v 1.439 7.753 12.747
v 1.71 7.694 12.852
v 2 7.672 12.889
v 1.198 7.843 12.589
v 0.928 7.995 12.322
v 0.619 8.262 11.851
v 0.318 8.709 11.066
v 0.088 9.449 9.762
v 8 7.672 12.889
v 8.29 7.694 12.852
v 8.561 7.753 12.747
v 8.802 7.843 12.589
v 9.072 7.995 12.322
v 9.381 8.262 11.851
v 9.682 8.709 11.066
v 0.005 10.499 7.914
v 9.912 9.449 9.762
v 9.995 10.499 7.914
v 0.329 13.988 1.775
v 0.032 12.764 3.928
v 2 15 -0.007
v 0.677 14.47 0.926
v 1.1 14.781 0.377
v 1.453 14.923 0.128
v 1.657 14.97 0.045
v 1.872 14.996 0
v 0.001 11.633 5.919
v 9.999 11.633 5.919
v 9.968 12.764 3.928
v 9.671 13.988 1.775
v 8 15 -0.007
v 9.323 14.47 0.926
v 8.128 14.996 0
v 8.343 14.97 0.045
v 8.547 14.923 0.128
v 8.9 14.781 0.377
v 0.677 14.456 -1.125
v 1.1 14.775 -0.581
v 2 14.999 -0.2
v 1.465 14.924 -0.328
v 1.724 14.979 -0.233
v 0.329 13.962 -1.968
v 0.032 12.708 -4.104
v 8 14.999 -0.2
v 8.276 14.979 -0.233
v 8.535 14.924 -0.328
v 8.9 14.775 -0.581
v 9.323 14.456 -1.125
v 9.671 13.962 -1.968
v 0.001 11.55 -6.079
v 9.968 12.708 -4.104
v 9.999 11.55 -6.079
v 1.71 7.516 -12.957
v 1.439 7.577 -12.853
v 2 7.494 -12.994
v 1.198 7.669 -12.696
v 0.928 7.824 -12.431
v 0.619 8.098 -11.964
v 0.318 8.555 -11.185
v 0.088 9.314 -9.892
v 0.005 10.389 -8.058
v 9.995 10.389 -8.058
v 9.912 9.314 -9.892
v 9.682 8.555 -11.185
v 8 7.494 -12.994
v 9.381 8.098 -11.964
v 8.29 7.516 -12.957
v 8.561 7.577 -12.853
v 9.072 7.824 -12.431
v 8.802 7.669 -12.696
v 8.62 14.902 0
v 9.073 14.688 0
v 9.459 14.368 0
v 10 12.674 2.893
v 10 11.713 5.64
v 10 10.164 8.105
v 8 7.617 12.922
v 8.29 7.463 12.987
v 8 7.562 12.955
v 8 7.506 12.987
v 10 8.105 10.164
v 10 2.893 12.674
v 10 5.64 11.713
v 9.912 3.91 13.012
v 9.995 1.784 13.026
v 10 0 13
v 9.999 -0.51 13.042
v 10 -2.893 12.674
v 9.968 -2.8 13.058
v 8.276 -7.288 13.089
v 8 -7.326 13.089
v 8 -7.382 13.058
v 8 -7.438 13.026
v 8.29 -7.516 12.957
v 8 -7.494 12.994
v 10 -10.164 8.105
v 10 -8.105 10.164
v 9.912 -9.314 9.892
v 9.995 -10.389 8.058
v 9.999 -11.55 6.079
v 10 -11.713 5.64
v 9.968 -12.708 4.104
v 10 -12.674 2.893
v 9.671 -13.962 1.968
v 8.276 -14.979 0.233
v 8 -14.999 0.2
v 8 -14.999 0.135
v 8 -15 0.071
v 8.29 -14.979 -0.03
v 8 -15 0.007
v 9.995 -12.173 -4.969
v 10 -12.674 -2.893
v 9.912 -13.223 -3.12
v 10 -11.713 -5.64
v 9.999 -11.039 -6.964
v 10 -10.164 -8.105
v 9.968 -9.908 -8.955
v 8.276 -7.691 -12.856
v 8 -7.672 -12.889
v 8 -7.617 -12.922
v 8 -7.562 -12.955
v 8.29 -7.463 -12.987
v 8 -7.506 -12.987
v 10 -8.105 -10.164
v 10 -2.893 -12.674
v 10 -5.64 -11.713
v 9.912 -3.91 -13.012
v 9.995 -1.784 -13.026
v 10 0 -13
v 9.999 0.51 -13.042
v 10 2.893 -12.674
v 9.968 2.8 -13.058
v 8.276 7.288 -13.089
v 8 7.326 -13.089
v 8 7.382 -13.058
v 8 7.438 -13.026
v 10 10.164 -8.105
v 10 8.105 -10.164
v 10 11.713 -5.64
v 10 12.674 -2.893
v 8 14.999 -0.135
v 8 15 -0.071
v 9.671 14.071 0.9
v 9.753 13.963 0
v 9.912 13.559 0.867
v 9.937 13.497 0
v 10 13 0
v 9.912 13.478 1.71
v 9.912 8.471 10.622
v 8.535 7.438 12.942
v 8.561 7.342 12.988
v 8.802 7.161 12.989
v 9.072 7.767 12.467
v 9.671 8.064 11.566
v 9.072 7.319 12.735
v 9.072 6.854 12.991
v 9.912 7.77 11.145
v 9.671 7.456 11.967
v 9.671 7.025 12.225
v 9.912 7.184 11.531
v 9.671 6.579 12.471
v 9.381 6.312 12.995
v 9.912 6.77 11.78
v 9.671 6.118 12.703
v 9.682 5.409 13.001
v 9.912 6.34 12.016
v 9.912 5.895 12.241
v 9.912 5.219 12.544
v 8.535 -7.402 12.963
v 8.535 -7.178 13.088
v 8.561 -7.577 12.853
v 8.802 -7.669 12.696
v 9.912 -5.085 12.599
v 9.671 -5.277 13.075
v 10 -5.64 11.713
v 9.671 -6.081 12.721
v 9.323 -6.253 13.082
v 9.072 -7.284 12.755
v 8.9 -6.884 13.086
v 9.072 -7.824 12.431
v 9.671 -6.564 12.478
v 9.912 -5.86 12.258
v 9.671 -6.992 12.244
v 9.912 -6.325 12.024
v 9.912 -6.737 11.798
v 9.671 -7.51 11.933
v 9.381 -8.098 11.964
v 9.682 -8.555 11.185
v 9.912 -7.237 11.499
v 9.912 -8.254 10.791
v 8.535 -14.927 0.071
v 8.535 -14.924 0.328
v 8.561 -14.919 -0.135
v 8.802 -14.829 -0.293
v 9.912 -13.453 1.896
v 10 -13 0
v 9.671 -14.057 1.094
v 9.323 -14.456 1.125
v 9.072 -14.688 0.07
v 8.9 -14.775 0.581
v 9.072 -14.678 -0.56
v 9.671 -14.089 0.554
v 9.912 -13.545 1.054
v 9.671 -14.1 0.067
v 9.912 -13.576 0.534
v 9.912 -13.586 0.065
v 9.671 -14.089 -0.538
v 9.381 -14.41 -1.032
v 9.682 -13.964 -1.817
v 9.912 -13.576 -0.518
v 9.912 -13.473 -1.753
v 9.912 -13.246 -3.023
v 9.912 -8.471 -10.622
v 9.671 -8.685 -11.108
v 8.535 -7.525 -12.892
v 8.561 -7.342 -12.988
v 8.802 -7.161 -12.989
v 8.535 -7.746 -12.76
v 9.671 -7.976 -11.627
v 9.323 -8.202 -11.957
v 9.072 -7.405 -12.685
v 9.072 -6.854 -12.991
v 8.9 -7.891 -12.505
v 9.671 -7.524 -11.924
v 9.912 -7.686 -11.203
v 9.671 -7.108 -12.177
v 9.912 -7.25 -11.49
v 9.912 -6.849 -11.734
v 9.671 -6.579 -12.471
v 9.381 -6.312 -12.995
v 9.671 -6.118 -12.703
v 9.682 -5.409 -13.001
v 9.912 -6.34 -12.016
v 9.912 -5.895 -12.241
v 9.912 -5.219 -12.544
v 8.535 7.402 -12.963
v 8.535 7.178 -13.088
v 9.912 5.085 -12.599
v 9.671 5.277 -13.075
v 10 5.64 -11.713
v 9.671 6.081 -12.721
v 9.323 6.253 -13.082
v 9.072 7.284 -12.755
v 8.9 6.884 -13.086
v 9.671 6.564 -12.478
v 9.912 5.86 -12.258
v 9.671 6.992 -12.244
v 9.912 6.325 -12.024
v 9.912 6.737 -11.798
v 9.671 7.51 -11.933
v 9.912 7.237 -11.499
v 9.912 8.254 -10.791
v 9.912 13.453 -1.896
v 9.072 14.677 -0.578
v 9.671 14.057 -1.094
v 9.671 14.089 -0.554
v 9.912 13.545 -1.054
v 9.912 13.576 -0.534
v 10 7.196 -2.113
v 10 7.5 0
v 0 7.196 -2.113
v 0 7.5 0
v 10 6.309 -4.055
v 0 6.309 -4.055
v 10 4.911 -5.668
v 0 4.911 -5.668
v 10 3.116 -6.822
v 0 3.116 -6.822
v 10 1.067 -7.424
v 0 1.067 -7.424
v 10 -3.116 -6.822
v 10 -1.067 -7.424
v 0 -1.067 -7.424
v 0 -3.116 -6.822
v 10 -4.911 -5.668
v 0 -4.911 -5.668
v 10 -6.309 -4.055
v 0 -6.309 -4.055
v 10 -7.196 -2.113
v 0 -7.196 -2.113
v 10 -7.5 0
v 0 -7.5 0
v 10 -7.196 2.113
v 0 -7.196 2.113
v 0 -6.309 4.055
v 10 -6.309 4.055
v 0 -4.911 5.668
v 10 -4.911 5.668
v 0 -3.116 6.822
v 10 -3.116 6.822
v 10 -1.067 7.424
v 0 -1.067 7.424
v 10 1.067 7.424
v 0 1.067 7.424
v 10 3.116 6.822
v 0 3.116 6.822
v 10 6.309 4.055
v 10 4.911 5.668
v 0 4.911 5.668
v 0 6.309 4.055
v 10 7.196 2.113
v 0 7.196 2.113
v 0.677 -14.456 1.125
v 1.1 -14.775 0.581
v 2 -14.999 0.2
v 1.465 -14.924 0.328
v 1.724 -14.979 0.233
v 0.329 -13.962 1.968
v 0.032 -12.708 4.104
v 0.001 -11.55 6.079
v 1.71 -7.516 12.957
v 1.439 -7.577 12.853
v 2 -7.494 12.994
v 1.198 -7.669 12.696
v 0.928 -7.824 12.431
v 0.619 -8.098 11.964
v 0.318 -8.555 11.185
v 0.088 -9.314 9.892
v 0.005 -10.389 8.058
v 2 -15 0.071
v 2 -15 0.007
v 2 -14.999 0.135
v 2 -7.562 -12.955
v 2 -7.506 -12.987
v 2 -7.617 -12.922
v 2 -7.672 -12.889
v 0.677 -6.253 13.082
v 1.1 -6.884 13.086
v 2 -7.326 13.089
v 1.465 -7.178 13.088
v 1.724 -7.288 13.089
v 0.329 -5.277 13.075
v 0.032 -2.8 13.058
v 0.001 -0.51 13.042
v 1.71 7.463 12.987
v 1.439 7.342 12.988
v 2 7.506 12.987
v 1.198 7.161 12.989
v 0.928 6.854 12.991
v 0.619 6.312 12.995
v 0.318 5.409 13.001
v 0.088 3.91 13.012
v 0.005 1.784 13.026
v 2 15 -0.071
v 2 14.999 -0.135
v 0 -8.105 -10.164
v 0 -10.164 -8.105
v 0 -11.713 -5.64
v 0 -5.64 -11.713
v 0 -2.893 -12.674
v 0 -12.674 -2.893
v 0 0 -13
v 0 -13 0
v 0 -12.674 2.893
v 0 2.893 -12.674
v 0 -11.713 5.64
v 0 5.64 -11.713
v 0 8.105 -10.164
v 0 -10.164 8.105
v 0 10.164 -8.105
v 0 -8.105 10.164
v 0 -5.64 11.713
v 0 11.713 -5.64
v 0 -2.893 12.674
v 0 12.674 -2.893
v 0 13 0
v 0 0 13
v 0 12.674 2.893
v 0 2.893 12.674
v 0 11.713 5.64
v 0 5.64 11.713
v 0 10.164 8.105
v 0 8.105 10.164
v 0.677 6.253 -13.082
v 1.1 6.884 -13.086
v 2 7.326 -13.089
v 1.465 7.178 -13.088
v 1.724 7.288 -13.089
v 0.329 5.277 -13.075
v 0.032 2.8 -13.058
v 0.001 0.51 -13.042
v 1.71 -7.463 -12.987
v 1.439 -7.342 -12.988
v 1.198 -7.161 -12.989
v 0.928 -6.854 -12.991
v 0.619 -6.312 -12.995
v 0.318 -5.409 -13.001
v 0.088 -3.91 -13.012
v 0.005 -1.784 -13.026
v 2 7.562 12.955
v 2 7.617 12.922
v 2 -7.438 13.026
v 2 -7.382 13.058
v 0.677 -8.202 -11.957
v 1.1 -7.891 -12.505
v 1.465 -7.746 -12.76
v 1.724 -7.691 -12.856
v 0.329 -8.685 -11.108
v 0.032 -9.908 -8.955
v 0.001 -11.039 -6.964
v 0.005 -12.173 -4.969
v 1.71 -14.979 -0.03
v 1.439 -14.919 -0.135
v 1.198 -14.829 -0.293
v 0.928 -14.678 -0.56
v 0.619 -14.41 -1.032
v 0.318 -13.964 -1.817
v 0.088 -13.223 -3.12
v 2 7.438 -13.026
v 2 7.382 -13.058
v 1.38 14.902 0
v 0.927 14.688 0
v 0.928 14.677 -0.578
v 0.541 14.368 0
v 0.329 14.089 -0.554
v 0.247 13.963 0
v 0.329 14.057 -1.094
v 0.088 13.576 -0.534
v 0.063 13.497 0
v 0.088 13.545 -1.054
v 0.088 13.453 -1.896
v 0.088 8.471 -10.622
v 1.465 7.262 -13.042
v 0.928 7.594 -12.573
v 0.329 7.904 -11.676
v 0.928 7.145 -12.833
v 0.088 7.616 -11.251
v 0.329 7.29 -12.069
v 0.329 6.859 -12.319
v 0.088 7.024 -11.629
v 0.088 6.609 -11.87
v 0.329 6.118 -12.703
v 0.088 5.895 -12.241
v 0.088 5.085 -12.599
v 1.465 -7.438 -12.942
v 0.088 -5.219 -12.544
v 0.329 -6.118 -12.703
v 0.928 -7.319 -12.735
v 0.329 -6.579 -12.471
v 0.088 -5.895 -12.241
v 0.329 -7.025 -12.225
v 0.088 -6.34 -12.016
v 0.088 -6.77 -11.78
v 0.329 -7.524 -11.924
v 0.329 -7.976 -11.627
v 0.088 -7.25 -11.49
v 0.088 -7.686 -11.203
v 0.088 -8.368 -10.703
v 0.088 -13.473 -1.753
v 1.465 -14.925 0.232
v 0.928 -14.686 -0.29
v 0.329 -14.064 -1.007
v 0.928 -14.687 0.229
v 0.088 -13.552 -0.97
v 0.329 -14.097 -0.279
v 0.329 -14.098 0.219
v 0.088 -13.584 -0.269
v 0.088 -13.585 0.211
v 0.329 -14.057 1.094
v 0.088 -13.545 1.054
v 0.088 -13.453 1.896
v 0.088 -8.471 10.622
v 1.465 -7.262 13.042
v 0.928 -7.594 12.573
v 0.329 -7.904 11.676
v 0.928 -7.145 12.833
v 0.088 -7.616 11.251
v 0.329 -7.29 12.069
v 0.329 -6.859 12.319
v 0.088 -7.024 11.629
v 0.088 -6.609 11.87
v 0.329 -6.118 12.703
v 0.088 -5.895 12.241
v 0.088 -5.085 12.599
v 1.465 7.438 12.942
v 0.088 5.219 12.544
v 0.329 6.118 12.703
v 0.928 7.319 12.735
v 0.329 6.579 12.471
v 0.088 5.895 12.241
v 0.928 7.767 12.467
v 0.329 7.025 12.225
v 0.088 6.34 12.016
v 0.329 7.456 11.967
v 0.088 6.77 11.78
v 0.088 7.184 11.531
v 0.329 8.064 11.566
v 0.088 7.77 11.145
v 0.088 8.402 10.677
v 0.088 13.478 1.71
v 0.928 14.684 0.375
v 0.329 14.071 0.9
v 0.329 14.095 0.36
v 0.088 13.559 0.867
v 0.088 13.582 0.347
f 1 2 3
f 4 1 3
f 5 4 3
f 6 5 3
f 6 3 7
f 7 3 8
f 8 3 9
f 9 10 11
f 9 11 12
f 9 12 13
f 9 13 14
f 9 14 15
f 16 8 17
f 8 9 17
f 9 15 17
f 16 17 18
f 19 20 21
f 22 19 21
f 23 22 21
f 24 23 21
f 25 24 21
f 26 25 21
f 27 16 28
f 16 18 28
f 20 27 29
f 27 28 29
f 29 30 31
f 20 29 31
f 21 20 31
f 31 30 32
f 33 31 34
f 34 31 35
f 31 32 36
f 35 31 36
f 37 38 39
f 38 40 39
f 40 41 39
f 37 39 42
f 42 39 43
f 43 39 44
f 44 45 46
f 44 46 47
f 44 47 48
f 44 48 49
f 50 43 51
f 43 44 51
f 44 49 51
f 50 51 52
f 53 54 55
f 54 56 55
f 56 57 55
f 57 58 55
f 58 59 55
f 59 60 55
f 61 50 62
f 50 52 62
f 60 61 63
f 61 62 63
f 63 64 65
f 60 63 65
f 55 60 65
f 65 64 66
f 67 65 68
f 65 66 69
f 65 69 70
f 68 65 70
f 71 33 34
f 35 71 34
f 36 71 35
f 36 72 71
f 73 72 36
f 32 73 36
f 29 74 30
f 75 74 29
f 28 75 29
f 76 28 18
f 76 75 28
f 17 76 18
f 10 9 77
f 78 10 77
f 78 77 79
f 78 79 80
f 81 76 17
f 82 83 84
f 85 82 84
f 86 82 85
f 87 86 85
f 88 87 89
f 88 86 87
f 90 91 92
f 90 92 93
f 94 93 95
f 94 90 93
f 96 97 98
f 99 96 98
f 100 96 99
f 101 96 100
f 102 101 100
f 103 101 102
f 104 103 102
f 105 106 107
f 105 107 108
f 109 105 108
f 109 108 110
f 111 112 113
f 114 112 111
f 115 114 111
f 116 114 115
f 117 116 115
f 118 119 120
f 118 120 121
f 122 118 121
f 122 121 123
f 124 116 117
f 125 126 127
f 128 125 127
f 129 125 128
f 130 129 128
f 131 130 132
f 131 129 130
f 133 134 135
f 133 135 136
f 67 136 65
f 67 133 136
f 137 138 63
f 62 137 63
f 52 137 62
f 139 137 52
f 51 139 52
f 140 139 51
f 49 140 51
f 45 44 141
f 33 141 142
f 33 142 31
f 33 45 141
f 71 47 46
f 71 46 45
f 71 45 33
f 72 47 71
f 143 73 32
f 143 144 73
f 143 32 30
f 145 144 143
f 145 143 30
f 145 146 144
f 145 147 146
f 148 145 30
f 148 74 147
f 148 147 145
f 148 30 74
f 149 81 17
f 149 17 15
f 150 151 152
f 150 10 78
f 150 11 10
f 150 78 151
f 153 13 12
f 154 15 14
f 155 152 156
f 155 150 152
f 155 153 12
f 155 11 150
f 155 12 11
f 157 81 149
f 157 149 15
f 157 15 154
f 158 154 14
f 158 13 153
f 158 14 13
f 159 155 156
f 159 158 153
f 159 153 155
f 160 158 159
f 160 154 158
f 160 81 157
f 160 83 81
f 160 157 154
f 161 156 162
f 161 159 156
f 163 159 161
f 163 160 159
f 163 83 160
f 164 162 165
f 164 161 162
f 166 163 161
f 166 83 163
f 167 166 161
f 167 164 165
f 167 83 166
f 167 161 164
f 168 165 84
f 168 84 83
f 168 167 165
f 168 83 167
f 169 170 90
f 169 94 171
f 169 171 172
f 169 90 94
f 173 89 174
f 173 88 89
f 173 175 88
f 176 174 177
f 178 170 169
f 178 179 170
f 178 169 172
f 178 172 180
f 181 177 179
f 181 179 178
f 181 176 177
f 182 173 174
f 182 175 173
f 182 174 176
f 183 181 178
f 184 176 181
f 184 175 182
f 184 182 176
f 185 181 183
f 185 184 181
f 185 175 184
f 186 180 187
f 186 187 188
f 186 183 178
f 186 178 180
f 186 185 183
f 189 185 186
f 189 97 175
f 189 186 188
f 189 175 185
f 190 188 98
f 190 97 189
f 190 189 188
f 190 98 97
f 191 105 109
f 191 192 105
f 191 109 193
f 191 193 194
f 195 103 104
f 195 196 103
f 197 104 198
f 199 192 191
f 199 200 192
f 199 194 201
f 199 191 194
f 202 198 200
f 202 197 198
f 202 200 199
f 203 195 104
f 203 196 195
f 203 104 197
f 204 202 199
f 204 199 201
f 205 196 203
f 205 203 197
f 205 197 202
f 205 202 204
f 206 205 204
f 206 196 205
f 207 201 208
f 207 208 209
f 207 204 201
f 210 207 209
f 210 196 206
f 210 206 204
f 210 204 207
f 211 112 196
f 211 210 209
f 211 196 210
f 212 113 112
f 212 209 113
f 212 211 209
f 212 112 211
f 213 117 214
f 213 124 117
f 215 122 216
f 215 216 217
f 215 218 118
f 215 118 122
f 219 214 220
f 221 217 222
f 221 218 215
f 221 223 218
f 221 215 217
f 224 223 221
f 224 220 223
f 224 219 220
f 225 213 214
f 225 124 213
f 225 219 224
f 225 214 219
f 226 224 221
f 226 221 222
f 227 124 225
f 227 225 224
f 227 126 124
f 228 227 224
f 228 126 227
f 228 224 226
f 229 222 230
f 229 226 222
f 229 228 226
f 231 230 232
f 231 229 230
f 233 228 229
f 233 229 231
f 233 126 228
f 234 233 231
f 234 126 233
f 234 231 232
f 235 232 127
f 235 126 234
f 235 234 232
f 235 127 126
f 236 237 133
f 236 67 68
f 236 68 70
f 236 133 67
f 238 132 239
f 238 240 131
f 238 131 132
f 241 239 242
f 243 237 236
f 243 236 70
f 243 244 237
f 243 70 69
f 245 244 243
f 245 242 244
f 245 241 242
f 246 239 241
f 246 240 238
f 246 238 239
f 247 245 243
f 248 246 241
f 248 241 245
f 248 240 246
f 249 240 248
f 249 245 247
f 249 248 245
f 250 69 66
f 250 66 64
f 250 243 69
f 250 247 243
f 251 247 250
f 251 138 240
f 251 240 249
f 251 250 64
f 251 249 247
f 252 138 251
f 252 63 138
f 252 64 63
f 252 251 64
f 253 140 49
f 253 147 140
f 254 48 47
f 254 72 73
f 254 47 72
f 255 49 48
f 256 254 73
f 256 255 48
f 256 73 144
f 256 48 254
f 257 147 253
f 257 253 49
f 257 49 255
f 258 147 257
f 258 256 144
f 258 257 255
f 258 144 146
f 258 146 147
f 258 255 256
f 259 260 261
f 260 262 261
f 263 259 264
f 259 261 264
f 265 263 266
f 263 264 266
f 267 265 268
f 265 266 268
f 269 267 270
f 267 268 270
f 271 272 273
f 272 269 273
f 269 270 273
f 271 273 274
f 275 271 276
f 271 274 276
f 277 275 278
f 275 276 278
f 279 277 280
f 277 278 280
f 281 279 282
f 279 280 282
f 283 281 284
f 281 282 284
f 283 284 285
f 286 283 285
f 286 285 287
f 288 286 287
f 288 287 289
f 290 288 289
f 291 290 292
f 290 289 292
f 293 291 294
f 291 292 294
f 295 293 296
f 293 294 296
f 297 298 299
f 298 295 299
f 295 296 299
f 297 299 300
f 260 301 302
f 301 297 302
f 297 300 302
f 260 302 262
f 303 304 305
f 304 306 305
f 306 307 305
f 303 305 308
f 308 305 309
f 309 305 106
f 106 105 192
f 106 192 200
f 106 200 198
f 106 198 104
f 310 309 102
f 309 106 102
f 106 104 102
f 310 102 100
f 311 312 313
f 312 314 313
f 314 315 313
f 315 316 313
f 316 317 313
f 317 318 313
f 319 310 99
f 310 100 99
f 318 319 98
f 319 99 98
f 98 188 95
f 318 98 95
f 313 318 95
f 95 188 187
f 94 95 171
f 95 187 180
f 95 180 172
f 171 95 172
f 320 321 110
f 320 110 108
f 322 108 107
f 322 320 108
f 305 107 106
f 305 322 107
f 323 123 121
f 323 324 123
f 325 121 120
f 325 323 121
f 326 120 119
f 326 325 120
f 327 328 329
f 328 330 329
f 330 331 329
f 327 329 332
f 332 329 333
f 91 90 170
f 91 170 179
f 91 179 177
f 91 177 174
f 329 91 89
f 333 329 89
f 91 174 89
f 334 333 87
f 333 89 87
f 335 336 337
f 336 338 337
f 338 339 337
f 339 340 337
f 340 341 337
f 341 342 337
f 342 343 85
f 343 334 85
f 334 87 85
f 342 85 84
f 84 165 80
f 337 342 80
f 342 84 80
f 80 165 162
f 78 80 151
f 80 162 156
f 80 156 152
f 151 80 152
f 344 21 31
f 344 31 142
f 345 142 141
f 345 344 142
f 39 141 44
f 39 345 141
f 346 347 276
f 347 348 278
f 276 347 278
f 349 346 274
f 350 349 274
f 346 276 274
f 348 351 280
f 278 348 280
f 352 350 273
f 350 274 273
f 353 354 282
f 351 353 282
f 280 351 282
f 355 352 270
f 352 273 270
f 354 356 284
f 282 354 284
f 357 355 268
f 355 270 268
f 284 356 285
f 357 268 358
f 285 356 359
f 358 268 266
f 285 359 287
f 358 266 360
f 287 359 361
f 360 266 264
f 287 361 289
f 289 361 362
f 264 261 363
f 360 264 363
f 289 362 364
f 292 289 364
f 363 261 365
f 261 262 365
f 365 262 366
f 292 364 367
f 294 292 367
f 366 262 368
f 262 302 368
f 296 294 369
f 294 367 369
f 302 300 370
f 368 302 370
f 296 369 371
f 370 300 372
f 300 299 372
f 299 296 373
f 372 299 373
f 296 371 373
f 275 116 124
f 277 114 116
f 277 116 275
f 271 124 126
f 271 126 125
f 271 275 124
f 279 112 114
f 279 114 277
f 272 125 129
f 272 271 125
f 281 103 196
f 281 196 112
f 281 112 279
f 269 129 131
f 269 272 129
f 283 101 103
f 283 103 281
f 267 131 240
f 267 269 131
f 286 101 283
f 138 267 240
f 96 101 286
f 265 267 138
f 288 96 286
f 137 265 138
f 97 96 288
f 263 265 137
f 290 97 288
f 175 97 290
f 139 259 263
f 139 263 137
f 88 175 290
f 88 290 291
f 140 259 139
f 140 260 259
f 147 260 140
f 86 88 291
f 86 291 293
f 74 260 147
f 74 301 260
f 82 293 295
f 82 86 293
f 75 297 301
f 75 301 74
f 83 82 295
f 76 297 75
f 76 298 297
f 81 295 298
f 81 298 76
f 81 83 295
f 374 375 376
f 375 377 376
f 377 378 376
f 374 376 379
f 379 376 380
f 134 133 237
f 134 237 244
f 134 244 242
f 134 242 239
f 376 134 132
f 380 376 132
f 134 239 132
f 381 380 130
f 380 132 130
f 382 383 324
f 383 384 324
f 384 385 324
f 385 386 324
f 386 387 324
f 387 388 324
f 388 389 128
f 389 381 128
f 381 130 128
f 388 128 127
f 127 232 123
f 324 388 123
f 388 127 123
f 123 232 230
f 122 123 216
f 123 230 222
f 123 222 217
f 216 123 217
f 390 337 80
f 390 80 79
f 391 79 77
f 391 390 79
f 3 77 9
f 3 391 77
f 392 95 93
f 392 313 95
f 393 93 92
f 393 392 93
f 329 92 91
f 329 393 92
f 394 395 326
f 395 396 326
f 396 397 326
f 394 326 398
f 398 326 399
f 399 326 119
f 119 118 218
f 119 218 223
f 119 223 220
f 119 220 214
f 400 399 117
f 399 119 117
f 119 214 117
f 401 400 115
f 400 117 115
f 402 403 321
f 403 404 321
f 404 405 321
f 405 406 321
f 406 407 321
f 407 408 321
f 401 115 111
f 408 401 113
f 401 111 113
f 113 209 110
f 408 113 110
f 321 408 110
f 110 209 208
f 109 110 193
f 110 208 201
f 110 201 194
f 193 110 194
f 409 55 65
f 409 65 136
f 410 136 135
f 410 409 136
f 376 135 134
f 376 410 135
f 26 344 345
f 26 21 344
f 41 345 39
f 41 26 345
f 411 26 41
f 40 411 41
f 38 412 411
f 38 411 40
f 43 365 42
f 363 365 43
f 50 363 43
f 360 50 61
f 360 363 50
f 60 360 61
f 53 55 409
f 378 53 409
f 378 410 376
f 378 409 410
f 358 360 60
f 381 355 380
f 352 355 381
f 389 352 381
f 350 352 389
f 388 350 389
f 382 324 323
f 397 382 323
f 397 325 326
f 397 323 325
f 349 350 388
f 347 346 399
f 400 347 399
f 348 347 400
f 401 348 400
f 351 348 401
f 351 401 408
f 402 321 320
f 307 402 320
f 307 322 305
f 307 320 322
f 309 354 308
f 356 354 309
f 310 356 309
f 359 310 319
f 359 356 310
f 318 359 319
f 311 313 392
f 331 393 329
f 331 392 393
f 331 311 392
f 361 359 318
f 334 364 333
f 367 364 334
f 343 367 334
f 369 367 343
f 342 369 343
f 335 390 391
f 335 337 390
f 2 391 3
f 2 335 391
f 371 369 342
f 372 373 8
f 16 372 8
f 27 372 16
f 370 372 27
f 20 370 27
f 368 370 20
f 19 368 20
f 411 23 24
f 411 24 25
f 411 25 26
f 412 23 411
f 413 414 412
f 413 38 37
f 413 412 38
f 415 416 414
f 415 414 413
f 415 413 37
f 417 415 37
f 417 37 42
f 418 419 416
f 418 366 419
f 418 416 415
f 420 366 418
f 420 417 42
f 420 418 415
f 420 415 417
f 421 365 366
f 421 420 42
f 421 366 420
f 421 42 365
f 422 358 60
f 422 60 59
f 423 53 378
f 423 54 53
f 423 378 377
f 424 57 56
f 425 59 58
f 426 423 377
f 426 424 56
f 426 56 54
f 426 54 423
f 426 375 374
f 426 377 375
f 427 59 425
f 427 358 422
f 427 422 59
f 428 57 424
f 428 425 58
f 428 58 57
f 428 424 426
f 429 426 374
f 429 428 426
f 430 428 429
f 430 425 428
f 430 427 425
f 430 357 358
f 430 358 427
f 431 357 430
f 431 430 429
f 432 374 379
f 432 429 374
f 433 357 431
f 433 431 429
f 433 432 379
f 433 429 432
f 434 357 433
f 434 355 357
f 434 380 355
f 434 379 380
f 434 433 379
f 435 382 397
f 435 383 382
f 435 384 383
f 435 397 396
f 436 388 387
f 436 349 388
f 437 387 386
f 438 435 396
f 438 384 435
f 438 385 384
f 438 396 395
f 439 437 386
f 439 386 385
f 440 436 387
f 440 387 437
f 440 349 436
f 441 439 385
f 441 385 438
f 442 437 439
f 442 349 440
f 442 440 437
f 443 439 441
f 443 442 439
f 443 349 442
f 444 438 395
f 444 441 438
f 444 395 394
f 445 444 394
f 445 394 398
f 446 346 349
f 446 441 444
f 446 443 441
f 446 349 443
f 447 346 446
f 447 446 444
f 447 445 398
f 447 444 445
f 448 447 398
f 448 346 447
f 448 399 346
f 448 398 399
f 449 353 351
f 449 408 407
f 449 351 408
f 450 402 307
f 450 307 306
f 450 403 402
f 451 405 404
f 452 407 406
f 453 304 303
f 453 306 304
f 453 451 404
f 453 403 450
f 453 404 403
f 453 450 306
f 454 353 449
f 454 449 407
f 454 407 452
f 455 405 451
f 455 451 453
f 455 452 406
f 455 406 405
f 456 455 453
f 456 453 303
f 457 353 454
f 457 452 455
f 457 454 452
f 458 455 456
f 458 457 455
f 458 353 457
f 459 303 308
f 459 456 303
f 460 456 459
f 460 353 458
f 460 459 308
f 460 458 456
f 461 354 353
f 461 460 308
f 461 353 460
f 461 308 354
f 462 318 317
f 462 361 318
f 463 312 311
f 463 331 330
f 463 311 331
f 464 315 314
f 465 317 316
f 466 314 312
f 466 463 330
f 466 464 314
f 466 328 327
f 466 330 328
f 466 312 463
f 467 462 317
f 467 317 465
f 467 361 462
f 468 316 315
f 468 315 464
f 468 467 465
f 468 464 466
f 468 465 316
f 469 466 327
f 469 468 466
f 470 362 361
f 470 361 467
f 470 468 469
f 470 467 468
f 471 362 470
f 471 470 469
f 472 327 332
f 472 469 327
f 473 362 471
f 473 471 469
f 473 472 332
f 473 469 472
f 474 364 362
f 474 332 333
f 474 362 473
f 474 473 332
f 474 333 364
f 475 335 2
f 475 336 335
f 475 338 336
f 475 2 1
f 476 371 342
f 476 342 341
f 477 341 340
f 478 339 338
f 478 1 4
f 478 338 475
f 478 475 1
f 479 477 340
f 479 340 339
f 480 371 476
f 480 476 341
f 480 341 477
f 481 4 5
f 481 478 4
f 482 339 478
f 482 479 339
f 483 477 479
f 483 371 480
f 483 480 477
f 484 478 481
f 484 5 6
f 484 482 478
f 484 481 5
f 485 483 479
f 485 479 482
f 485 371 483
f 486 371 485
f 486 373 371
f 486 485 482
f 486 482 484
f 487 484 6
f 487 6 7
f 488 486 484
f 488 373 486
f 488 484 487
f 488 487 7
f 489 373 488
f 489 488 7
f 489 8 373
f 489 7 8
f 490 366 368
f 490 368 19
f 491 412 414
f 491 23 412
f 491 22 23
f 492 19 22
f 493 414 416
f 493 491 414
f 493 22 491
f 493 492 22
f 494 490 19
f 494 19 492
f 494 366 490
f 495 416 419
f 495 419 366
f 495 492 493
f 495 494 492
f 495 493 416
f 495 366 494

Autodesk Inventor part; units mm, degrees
ref_plane "YZ Plane" through (0, 0, 0) normal (1, 0, 0) x (0, 1, 0)
ref_plane "XZ Plane" through (0, 0, 0) normal (0, 1, 0) x (-1, 0, 0)
ref_plane "XY Plane" through (0, 0, 0) normal (0, 0, 1) x (1, 0, 0)
sketch "Sketch4" plane through (0, 0, 0) normal (1, 0, 0) x (0, 1, 0)
  circle A0 centre (0, 0) radius 7.5
  circle A1 centre (0, 0) radius 15
  dimension "d12" = 15
  dimension "d13" = 30
extrude "Extrusion3" add sketch "Sketch4" along normal blind 10
fillet "Fillet1" radius 2 2 edges at (10, -15, 0) (0, -15, 0)
sketch "Sketch6" plane through (10, 0, 0) normal (1, 0, 0) x (0, 0, -1)
  line L0 (-12.986, 7.6174) -> (0.1038, 15.0549)
  line L1 (0.1038, 15.0549) -> (13.0898, 7.4376)
  line L2 (13.0898, 7.4376) -> (12.986, -7.6174)
  line L3 (12.986, -7.6174) -> (-0.1038, -15.0549)
  line L4 (-0.1038, -15.0549) -> (-13.0898, -7.4376)
  line L5 (-13.0898, -7.4376) -> (-12.986, 7.6174)
  circle A0 centre (0, 0) radius 17.8514
  circle A1 centre (0, 0) radius 7.5945
extrude "Extrusion4" cut sketch "Sketch6" against normal blind 10 contours A0
properties part number "Nut" material "Steel, Carbon"
